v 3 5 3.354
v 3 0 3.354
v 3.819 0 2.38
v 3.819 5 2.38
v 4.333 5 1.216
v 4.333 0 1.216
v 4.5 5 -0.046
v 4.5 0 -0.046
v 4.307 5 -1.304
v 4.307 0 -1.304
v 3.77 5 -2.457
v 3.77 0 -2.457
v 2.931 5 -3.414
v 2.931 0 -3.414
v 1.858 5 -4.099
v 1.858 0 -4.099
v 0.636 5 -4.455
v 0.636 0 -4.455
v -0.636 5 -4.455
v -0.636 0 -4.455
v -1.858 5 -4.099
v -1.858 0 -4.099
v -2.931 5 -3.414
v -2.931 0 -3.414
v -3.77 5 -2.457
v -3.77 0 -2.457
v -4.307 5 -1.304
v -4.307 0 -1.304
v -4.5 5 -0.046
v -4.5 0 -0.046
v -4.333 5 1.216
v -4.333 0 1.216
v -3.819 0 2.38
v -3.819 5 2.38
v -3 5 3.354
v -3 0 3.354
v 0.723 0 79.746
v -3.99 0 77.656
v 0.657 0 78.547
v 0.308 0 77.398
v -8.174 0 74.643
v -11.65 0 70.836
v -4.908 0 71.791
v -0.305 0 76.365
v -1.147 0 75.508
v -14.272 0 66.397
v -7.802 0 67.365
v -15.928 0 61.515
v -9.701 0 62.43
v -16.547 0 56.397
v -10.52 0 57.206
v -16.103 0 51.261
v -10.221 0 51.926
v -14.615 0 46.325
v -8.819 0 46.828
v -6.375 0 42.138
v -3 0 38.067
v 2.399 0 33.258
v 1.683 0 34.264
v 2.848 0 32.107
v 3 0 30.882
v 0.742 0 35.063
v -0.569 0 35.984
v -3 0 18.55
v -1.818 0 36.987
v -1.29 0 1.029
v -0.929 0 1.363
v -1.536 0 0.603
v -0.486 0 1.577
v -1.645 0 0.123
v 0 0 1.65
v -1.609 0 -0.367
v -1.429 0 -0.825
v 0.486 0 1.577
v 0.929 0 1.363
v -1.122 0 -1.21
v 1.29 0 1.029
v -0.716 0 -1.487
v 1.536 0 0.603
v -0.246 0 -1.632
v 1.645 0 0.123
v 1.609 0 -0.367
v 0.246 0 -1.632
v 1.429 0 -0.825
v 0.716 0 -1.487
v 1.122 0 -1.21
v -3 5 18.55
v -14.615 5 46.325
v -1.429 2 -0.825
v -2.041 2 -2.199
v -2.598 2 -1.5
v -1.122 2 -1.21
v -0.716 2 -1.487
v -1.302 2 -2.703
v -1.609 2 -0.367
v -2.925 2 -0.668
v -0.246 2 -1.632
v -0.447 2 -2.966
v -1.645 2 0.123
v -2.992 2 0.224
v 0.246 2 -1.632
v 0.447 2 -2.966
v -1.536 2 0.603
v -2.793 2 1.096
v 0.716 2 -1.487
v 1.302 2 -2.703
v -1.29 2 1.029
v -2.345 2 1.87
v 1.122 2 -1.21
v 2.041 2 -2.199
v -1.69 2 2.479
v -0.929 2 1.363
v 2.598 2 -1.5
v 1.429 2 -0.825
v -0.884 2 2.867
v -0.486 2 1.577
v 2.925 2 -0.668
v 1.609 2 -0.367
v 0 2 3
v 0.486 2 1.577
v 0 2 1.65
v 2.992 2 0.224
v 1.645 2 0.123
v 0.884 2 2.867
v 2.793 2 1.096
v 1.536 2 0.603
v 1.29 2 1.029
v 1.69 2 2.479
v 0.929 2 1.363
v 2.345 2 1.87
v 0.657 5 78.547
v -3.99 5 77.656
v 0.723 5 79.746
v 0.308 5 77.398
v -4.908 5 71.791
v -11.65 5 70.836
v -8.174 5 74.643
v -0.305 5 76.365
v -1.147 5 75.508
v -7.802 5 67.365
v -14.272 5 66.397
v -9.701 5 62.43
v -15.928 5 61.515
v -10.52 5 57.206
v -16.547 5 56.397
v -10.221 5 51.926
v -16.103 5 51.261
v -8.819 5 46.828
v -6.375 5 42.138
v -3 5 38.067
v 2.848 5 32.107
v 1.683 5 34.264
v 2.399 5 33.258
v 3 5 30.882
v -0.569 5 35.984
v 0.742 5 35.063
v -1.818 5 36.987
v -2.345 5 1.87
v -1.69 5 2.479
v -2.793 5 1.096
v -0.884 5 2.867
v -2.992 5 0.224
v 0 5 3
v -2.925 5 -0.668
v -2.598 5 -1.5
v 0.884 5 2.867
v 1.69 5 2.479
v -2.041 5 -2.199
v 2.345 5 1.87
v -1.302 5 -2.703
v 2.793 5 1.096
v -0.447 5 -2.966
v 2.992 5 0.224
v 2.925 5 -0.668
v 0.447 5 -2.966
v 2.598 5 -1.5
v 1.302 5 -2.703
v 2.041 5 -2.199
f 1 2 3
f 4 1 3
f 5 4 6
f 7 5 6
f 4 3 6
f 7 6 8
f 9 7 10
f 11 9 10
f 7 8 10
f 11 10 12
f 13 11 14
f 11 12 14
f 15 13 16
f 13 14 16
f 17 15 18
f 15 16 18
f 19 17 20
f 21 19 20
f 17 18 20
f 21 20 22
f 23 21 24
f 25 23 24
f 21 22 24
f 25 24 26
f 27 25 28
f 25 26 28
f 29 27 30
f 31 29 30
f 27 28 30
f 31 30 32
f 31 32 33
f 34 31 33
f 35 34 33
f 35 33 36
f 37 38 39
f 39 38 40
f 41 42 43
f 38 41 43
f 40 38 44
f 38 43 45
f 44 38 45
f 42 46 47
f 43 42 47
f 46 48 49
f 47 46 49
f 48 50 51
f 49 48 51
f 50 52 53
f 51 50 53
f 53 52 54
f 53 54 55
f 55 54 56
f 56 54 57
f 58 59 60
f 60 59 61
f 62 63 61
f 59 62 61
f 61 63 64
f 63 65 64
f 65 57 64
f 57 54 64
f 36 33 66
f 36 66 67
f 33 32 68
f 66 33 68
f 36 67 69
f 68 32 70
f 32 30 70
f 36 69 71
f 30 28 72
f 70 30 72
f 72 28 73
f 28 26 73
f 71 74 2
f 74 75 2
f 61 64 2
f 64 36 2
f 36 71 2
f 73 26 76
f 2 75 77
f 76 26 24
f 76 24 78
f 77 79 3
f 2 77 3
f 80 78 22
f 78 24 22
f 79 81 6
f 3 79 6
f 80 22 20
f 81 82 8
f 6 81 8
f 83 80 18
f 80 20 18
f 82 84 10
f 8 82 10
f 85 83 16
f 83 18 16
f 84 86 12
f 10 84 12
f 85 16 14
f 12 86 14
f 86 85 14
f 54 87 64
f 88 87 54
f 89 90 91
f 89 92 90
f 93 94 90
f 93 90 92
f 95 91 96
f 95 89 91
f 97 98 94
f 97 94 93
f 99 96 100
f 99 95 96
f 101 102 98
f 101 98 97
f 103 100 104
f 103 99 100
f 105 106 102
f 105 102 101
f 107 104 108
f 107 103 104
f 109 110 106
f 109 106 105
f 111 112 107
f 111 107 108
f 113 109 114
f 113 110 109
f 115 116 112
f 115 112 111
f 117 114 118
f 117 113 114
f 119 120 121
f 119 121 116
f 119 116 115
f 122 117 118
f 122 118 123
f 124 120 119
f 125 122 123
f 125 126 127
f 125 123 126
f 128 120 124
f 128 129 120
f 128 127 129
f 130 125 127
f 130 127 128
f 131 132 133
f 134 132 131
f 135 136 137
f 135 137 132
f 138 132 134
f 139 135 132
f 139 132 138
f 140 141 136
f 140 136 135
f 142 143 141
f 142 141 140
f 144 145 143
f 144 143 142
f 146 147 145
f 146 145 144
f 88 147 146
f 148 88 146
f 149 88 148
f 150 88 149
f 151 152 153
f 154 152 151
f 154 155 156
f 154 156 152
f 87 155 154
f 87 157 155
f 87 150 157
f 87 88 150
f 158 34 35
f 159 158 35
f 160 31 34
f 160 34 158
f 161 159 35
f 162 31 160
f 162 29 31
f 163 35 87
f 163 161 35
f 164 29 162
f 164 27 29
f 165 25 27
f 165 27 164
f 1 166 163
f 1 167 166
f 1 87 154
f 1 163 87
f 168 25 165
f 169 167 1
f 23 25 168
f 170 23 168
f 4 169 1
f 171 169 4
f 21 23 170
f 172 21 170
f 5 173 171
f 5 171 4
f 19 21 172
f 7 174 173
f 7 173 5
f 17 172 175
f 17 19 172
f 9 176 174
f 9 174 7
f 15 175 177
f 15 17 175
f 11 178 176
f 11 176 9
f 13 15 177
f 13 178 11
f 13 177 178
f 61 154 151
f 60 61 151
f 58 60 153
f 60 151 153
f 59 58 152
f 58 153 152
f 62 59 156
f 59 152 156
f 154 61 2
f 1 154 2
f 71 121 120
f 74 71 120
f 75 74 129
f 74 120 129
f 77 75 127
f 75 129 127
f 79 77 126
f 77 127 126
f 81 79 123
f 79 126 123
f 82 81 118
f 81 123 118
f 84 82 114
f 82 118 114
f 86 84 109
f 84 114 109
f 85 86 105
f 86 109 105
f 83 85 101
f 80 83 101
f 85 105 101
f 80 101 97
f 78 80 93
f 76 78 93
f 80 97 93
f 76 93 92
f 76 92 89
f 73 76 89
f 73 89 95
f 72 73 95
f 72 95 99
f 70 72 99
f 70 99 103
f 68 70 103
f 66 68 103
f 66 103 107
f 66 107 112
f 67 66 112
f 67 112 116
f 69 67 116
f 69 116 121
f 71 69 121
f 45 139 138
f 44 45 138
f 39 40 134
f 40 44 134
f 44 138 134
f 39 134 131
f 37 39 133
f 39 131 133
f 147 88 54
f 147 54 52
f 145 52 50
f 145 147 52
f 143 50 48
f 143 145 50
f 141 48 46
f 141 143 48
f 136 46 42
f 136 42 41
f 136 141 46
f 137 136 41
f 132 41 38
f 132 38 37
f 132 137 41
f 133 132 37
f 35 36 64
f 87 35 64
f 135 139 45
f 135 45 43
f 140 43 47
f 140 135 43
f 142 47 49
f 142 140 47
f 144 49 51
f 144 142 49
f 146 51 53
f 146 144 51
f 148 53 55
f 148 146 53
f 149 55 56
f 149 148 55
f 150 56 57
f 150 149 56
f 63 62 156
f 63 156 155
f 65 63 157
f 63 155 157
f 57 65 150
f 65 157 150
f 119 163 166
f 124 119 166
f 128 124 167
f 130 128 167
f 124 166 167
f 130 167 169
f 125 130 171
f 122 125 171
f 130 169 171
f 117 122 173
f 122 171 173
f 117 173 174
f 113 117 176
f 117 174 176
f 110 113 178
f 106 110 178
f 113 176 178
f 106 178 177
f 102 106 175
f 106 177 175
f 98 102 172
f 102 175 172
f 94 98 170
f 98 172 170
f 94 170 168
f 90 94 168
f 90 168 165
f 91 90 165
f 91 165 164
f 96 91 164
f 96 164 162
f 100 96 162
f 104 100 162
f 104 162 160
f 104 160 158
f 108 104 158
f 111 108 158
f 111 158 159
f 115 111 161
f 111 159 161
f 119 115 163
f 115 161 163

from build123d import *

# Parameters (mm, degrees)
EXTRUDE_2_DEPTH     = 5
SKETCH_4_R          = 1.65
CUT_EXTRUDE_1_DEPTH = 5
EXTRUDE_3_DEPTH     = 5
SKETCH_7_R          = 3
CUT_EXTRUDE_2_DEPTH = 3
CUT_EXTRUDE_3_DEPTH = 7.5
EXTRUDE_4_DEPTH     = 5
FILLET_1_R          = 5


with BuildPart() as part:
    # 草图3 → 凸台-拉伸2 (new body)
    with BuildSketch(Plane(origin=(0, 0, 0), x_dir=(1, 0, 0), z_dir=(0, 1, 0))):
        with BuildLine():
            Line((-3, -3.354101966), (-3, -7.416198487))
            Line((-3, -7.416198487), (-3, -43.854101966))
            Line((-3, -43.854101966), (3, -43.854101966))
            Line((3, -43.854101966), (3, -10.583005244))
            Line((3, -10.583005244), (3, -7.416198487))
            Line((3, -7.416198487), (3, -3.354101966))
            ThreePointArc((3, -3.354101966), (0, 4.5), (-3, -3.354101966))
        make_face()
    extrude(amount=EXTRUDE_2_DEPTH)

    # 草图4 → 切除-拉伸1 (cut)
    with BuildSketch(Plane(origin=(0, 5, 0), x_dir=(1, 0, 0), z_dir=(0, 1, 0))):
        with Locations(Location((0, 0, 0), (0, 0, 270))):
            Circle(SKETCH_4_R)
    extrude(amount=-CUT_EXTRUDE_1_DEPTH, mode=Mode.SUBTRACT)

    # 草图6 → 凸台-拉伸3 (add)
    with BuildSketch(Plane(origin=(0, 5, 0), x_dir=(1, 0, 0), z_dir=(0, 1, 0))):
        with BuildLine():
            Line((3, -33.74604712), (-3, -33.74604712))
            ThreePointArc((-3, -33.74604712), (-16.46902092, -57.986607816), (0.722500961, -79.745993902))
            Line((0.722500961, -79.745993902), (1.949520222, -77.620734201))
            ThreePointArc((1.949520222, -77.620734201), (-10.543317179, -55.371702353), (3, -33.74604712))
        make_face()
    extrude(amount=-EXTRUDE_3_DEPTH)

    # 草图7 → 切除-拉伸2 (cut)
    with BuildSketch(Plane(origin=(0, 5, 0), x_dir=(1, 0, 0), z_dir=(0, 1, 0))):
        with Locations(Location((0, 0, 0), (0, 0, 270))):
            Circle(SKETCH_7_R)
    extrude(amount=-CUT_EXTRUDE_2_DEPTH, mode=Mode.SUBTRACT)

    # 草图8 → 切除-拉伸3 (cut)
    with BuildSketch(Plane(origin=(0, 5, 0), x_dir=(1, 0, 0), z_dir=(0, 1, 0))):
        with BuildLine():
            Line((-3, -38.067187498), (-3, -43.854101966))
            Line((-3, -43.854101966), (3, -43.854101966))
            Line((3, -43.854101966), (3, -33.74604712))
            ThreePointArc((3, -33.74604712), (-0.160637142, -35.683569047), (-3, -38.067187498))
        make_face()
    extrude(amount=-CUT_EXTRUDE_3_DEPTH, mode=Mode.SUBTRACT)

    # 草图9 → 凸台-拉伸4 (add)
    with BuildSketch(Plane(origin=(0, 5, 0), x_dir=(1, 0, 0), z_dir=(0, 1, 0))):
        with BuildLine():
            Line((-3, -18.550074543), (-14.614967684, -46.324924269))
            ThreePointArc((-14.614967684, -46.324924269), (-9.917875534, -39.010182445), (-3, -33.74604712))
            Line((-3, -33.74604712), (-3, -18.550074543))
        make_face()
    extrude(amount=-EXTRUDE_4_DEPTH)

    # 圆角1
    # the kernel refuses this fillet: 5 mm, written as the material it takes off along each edge
    with BuildSketch(Plane(origin=(1.949520222, 14.371610933, 77.620734201), x_dir=(-0.4999999999999996, 0, 0.8660254037844388), z_dir=(0, -1, 0))) as fillet_1_piece_1:
        with BuildLine():
            CenterArc((4.662743969, 4.485712903), FILLET_1_R, 188.59932897, 55.185648669)
            Line((-0.281046693, 3.738094086), (-0.379922506, 3.723141709))
            ThreePointArc((-0.379922506, 3.723141709), (-0.170079243, 1.866824898), (-0.1, 0))
            Line((-0.1, 0), (0, -0.1))
            ThreePointArc((0, -0.1), (1.227019261, -0.1), (2.409864412, -0.089714258))
            Line((2.409864412, -0.089714258), (2.454038521, 0))
        make_face()
    extrude(amount=23.743221866, mode=Mode.SUBTRACT)
    with BuildSketch(Plane(origin=(3, 12.160146085, 33.74604712), x_dir=(0, 0, -1), z_dir=(0, -1, 0))) as fillet_1_piece_2:
        with BuildLine():
            CenterArc((2.864058434, -5), FILLET_1_R, 90, 56.748348073)
            Line((-1.317293303, -2.258413296), (-1.400920337, -2.203581562))
            ThreePointArc((-1.400920337, -2.203581562), (-0.715482953, -1.096055019), (-0.088896208, 0.045798081))
            Line((-0.088896208, 0.045798081), (0, 0.1))
            Line((0, 0.1), (2.864058434, 0.1))
            Line((2.864058434, 0.1), (2.864058434, 0))
        make_face()
    extrude(amount=19.320292171, mode=Mode.SUBTRACT)


solid = part.part
